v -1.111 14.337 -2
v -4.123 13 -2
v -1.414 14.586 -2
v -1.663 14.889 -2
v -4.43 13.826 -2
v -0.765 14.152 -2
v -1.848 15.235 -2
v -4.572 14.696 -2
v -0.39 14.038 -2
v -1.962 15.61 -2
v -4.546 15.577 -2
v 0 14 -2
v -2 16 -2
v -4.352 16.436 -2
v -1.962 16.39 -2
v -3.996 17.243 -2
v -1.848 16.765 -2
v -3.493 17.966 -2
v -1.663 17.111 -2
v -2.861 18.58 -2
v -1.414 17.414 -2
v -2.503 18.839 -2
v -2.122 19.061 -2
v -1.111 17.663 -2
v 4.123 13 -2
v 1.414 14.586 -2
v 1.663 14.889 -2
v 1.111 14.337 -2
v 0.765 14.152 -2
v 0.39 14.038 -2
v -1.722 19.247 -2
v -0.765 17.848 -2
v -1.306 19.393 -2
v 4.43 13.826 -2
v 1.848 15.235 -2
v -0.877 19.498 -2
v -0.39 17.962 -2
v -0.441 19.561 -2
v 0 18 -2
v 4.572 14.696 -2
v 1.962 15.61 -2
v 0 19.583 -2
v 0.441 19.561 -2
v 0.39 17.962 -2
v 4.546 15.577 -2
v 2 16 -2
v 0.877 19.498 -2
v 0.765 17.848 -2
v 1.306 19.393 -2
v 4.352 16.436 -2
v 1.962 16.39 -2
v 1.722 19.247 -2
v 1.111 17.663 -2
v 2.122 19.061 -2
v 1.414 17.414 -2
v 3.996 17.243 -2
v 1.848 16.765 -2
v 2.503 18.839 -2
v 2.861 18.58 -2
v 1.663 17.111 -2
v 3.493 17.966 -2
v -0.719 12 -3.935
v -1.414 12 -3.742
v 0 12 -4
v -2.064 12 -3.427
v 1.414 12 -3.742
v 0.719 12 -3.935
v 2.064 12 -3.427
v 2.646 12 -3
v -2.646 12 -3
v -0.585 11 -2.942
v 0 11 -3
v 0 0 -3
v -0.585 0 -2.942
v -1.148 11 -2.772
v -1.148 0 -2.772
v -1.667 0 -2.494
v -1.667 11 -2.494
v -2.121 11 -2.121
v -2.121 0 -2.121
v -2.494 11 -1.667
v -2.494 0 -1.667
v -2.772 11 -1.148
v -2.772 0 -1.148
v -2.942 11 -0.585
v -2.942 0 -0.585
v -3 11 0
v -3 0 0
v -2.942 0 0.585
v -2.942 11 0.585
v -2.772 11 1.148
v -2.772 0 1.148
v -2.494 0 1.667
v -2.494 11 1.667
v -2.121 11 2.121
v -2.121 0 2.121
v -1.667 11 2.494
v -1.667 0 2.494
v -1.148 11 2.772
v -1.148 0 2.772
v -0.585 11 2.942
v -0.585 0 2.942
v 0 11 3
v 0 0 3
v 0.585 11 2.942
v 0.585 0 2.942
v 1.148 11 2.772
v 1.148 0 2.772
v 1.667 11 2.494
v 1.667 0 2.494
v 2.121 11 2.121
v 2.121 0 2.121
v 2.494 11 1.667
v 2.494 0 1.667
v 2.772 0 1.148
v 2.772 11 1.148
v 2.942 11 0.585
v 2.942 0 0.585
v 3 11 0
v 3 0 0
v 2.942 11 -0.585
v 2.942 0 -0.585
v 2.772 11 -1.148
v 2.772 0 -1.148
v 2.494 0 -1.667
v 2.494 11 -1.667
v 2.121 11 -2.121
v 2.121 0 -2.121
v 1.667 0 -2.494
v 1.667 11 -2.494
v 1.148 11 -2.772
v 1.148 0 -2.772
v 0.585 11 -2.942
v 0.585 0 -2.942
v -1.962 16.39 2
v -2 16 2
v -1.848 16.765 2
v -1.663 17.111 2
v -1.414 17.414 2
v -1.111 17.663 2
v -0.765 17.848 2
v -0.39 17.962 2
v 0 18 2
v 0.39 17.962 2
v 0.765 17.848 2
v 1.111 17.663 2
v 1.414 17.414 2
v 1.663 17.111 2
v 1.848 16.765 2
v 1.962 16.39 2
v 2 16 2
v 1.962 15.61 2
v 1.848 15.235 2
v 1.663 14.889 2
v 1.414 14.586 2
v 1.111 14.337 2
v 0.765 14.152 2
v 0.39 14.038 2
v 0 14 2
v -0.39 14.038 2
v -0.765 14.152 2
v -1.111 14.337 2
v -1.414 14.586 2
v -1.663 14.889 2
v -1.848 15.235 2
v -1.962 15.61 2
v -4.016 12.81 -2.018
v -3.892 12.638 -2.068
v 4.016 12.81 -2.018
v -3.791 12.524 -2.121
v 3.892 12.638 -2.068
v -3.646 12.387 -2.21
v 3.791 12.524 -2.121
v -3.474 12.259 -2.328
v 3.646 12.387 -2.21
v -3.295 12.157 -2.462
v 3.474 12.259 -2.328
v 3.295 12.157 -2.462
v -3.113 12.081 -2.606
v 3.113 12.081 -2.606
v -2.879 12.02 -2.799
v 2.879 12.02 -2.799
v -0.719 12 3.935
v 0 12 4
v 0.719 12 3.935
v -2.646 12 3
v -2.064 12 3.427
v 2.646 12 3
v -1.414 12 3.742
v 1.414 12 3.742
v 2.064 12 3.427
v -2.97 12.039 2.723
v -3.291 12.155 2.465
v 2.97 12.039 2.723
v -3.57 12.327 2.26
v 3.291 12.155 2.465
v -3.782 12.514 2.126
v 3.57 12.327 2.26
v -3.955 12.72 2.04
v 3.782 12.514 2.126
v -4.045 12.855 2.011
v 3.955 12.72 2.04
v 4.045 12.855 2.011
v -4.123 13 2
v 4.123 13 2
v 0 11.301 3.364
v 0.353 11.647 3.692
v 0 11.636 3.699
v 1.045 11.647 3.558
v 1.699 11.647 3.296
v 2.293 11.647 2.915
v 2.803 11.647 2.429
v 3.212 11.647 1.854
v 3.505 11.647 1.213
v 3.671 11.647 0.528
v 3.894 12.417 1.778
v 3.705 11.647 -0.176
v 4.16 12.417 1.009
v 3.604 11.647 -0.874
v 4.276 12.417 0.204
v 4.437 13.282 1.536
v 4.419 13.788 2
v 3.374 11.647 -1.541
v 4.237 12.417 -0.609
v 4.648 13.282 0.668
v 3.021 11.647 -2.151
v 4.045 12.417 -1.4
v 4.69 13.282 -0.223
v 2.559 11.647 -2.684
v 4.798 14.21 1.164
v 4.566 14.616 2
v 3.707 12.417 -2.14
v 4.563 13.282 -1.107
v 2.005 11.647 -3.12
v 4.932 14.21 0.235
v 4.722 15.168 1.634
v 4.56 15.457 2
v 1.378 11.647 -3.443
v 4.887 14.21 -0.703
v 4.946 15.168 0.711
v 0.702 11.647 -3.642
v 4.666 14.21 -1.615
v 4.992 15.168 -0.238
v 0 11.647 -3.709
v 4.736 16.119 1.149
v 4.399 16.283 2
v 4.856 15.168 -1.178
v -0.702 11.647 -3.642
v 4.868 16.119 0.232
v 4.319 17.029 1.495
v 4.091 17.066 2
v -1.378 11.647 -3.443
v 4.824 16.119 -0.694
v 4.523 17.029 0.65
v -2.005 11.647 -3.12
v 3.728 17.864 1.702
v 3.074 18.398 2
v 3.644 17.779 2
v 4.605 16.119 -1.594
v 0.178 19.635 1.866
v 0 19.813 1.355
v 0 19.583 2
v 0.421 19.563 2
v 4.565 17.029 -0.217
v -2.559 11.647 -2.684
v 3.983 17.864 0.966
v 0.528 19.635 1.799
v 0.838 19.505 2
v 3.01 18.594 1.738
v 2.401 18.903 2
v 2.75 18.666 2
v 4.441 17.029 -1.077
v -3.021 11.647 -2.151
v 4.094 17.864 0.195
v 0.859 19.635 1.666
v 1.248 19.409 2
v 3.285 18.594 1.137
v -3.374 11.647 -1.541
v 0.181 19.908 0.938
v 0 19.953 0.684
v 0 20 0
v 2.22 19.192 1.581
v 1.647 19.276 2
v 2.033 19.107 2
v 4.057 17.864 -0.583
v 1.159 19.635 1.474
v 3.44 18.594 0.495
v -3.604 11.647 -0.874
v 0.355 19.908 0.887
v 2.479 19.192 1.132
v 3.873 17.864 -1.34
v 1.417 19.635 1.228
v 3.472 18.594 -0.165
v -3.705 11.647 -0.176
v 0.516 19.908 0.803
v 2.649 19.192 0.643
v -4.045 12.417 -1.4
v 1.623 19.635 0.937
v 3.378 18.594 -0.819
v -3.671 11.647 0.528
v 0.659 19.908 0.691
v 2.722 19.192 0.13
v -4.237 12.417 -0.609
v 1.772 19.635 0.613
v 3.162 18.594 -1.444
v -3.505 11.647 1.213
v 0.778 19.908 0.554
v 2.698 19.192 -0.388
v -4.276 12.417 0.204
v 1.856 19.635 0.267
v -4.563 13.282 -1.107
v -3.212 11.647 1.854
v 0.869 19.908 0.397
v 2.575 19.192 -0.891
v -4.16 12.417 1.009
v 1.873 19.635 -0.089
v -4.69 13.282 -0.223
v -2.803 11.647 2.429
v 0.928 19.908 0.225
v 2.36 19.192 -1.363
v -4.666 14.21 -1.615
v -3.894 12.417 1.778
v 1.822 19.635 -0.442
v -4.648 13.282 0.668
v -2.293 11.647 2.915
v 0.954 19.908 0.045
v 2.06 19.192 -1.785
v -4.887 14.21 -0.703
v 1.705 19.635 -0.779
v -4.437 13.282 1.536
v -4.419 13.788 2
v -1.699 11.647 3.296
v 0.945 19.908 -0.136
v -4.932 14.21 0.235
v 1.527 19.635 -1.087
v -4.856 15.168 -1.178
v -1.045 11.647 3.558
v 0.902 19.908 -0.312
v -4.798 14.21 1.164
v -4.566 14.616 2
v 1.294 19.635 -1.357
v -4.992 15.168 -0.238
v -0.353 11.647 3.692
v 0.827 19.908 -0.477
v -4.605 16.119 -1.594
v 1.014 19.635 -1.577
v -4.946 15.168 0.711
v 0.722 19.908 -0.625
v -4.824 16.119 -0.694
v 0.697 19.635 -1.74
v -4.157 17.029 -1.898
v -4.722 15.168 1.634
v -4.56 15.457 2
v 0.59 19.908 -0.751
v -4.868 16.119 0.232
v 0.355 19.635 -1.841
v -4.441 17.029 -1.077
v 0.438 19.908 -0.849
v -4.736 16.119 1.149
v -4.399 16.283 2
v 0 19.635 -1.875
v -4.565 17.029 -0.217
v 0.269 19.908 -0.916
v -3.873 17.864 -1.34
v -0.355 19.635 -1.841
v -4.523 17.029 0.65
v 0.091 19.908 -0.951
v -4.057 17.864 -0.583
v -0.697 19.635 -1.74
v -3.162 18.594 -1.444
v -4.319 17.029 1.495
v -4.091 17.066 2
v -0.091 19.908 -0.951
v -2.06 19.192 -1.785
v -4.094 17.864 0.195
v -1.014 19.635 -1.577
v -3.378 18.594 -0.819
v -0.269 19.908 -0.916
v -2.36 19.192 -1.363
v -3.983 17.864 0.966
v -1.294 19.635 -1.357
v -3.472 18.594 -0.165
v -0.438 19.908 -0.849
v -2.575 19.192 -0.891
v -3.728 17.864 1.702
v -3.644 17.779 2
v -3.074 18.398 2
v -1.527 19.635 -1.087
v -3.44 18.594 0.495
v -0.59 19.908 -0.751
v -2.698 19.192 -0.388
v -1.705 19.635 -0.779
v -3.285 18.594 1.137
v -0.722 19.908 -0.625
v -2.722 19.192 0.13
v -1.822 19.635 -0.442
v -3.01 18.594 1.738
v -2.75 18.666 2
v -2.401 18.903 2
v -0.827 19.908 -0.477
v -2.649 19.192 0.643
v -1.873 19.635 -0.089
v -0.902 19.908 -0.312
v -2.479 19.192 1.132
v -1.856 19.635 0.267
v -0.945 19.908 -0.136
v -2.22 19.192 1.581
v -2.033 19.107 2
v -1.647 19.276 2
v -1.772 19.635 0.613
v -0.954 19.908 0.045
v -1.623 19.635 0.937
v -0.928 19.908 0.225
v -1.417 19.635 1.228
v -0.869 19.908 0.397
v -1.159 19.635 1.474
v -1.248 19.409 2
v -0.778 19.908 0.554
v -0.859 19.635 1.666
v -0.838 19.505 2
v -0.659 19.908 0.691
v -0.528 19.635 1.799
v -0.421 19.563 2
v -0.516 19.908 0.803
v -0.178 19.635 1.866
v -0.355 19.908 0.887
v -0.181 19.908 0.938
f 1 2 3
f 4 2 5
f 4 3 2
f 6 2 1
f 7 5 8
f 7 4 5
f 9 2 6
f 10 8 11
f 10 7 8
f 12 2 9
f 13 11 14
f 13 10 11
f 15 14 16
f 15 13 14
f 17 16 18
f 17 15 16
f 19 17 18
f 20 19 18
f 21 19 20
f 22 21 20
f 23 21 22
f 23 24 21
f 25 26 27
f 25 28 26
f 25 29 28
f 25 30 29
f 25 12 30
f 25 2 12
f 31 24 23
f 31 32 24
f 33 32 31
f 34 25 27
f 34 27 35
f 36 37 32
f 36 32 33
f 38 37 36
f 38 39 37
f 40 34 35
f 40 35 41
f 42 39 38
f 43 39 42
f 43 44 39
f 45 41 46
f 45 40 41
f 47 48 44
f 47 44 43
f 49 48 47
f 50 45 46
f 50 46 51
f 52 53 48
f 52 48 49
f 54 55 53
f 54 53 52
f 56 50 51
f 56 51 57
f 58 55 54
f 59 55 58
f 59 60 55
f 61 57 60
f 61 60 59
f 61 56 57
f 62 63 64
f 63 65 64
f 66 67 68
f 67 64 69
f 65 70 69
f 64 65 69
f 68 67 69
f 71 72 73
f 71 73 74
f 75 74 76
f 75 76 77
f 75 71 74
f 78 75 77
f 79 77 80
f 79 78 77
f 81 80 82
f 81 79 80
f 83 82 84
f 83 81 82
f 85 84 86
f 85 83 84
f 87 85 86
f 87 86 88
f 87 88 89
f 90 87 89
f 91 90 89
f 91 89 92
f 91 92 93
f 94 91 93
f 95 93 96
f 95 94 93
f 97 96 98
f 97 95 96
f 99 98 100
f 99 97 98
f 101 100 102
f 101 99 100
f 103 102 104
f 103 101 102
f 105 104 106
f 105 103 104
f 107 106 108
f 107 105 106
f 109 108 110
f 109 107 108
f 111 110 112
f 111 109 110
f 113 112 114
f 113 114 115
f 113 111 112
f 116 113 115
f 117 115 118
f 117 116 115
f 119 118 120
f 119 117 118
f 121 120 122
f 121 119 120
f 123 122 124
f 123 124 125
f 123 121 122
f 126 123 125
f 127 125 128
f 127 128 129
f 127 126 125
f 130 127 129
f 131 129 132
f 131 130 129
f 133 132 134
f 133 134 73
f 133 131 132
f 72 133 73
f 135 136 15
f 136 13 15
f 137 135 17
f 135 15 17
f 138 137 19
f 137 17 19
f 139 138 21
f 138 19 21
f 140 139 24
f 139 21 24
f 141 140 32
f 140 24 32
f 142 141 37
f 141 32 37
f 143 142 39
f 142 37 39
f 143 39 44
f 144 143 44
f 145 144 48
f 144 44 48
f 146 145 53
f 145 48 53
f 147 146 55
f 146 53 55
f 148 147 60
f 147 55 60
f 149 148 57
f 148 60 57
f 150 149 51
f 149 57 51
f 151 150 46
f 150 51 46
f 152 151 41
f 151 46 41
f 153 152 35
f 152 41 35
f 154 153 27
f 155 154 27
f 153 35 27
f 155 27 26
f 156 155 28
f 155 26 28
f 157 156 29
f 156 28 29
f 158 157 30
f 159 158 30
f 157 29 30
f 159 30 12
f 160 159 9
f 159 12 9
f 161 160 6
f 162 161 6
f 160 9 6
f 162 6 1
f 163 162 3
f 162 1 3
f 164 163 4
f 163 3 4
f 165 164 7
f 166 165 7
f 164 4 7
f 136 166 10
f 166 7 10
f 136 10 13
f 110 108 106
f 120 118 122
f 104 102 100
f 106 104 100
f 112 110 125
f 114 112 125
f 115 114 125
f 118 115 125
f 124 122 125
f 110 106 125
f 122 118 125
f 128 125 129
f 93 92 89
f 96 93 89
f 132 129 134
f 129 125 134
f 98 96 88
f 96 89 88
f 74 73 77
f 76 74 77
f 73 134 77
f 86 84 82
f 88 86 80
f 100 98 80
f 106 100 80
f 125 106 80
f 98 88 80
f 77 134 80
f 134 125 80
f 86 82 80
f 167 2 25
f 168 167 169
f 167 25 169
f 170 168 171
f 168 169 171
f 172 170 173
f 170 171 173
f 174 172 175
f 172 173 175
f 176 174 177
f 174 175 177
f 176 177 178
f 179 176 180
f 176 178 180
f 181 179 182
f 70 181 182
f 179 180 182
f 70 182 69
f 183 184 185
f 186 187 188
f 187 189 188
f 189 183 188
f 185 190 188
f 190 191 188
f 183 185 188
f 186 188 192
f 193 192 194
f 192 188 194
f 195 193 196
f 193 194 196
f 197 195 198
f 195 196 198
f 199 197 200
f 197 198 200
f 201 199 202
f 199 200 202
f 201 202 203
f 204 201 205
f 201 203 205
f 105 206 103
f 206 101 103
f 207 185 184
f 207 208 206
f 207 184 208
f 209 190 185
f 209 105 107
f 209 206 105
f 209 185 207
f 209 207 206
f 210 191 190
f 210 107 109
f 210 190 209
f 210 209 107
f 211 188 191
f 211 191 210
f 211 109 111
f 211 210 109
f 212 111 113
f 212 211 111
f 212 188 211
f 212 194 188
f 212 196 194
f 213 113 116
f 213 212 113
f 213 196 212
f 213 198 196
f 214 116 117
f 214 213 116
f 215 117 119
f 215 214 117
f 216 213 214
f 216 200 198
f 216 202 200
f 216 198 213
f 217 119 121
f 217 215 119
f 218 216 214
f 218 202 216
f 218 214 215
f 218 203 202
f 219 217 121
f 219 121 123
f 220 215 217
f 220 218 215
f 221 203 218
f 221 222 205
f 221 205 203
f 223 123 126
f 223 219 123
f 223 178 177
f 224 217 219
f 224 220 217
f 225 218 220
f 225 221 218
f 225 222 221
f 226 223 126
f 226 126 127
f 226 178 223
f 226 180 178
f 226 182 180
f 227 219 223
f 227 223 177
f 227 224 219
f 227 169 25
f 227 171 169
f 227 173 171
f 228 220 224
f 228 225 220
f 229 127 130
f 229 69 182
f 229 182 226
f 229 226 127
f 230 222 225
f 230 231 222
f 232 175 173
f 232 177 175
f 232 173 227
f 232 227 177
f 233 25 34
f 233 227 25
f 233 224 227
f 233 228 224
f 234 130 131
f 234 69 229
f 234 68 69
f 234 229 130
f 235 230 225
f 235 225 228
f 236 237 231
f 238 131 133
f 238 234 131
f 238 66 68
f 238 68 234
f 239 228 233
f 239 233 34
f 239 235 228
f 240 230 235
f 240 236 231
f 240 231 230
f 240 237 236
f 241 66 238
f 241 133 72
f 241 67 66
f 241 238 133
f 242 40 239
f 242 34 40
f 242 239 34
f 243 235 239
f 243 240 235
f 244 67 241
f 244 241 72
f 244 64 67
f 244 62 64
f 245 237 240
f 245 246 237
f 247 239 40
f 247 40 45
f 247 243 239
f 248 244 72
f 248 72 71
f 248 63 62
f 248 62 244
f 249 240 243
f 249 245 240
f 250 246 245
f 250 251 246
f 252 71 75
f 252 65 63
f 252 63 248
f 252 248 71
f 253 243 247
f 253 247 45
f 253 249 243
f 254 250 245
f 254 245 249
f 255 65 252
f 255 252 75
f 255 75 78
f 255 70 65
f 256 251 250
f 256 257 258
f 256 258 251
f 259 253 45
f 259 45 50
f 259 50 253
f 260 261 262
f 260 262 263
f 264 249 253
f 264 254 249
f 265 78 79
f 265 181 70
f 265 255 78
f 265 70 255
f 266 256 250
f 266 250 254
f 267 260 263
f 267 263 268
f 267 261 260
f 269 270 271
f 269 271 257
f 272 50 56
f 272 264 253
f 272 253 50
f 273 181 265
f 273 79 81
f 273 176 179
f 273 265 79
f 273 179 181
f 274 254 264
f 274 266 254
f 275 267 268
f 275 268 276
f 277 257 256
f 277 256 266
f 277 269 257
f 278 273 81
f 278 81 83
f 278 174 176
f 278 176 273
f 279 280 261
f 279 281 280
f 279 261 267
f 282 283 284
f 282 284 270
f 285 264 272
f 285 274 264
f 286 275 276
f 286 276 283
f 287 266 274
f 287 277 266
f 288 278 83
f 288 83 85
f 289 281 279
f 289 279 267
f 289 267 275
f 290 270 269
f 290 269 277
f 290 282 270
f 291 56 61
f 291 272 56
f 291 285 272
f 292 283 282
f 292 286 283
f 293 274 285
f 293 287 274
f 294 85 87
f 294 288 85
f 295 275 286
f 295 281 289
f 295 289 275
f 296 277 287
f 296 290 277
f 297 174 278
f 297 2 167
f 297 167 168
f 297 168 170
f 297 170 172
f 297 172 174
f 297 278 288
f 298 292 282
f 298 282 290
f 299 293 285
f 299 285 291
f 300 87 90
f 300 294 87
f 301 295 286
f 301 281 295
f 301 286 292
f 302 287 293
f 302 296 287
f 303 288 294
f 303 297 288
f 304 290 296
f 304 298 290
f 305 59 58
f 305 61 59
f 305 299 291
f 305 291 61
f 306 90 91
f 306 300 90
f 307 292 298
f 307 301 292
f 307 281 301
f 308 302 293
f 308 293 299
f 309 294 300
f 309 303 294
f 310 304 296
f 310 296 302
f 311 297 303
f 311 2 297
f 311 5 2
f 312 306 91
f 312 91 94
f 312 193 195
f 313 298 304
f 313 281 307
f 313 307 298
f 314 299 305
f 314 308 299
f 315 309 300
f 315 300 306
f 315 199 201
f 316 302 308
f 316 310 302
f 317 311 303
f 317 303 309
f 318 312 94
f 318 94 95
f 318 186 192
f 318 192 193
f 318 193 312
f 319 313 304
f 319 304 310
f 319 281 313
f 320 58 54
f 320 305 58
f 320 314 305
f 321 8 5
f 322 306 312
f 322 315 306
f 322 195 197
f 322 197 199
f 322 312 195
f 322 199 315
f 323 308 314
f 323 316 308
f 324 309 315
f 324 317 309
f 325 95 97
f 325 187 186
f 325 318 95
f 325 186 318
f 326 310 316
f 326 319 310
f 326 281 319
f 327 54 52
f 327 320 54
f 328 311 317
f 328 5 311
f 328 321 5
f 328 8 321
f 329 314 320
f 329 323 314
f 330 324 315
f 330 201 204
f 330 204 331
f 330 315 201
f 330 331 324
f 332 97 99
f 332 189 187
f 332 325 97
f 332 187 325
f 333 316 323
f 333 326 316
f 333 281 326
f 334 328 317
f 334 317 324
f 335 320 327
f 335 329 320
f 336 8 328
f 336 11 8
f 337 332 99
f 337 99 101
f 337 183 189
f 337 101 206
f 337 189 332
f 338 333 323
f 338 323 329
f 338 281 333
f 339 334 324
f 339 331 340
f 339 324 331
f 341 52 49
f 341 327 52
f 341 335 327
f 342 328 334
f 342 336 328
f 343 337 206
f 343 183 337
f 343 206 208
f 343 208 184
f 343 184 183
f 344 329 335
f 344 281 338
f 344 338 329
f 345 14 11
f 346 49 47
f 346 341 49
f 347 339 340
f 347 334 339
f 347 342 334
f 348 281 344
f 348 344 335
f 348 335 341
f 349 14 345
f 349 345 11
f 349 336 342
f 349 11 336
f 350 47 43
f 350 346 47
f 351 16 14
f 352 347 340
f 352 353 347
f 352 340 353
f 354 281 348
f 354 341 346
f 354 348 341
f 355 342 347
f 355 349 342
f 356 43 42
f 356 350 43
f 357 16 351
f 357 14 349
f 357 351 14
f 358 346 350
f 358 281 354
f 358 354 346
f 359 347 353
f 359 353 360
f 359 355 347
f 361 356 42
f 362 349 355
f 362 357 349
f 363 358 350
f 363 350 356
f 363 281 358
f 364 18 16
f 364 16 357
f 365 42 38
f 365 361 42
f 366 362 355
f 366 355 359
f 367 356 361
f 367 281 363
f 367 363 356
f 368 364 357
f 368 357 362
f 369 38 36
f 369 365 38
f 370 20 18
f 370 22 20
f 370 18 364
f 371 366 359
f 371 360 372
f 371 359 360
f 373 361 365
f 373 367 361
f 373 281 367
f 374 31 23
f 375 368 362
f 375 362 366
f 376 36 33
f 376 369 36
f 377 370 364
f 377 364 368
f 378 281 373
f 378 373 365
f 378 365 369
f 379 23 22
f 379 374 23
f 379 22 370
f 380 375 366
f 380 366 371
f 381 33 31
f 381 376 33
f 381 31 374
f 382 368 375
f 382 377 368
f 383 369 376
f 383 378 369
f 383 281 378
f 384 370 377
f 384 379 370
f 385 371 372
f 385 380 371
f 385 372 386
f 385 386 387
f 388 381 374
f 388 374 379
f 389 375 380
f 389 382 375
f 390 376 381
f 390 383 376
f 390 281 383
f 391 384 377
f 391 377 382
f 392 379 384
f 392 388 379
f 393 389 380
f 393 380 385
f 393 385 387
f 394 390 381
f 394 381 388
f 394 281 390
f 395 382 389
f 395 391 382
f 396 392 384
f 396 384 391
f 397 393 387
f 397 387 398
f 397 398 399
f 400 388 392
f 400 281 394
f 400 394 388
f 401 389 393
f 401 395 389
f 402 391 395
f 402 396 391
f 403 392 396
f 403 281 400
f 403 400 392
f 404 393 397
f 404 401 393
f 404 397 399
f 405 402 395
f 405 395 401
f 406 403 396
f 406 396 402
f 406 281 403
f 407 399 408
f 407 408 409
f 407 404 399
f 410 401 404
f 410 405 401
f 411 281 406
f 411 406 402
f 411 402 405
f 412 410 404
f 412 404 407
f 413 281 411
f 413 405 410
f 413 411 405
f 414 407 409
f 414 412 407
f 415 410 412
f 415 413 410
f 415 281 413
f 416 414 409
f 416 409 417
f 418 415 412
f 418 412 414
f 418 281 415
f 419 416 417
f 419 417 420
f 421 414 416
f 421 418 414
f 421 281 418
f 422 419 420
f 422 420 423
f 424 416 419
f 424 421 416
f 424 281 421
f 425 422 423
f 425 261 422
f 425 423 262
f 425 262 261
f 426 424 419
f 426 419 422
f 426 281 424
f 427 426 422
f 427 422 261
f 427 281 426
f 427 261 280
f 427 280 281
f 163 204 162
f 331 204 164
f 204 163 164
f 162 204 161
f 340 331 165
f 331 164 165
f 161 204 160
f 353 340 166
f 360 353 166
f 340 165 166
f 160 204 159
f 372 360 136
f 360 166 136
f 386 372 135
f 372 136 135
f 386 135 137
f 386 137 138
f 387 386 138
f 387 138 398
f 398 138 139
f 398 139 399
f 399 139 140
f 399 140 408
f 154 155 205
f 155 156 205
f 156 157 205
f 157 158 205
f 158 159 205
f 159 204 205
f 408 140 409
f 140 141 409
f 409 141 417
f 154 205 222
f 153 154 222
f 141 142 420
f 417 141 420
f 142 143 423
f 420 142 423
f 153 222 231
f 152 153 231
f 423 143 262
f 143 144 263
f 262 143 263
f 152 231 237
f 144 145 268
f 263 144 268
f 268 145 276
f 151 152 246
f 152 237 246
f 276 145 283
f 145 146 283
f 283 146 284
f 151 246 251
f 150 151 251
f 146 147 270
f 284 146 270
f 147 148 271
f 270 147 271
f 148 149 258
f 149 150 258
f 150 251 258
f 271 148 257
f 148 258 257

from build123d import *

# Parameters (mm, degrees)
CROQUIS4_W            = 3
CROQUIS4_H            = 11
CROQUIS7_W            = 4
CROQUIS7_H            = 8
CORTAR_EXTRUIR1_DEPTH = 7.5
CROQUIS9_W            = 5
CROQUIS9_H            = 8
CORTAR_EXTRUIR2_DEPTH = 7.5
REDONDEO3_R           = 1
CROQUIS10_R           = 2
CORTAR_EXTRUIR3_DEPTH = 7.5


with BuildPart() as part:
    # Croquis4 → Revolución2 (revolve)
    with BuildSketch(Plane(origin=(0, 0, 0), x_dir=(0, 0, -1), z_dir=(1, 0, 0)), mode=Mode.PRIVATE) as revoluci_n2_sk:
        with Locations((-1.5, 5.5)):
            Rectangle(CROQUIS4_W, CROQUIS4_H)
    revolve(revoluci_n2_sk.sketch.rotate(Axis((0, 0, 0), (0, 1, 0)), 180), axis=Axis((0, 0, 0), (0, 1, 0)))

    # Croquis5 → Revolución3 (revolve)
    with BuildSketch(Plane(origin=(0, 0, 0), x_dir=(0, 0, -1), z_dir=(1, 0, 0))):
        with BuildLine():
            Line((0, 20), (0, 11))
            Line((0, 11), (-3, 11))
            ThreePointArc((-3, 11), (-4.74341649, 16.58113883), (0, 20))
        make_face()
    revolve(axis=Axis((0, 20, 0), (0, 1, 0)))

    # Croquis7 → Cortar-Extruir1 (cut, symmetric)
    with BuildSketch(Plane(origin=(0, 0, 0), x_dir=(0, 0, -1), z_dir=(1, 0, 0))):
        with Locations((4, 16)):
            Rectangle(CROQUIS7_W, CROQUIS7_H)
    extrude(amount=CORTAR_EXTRUIR1_DEPTH, both=True, mode=Mode.SUBTRACT)

    # Croquis9 → Cortar-Extruir2 (cut, symmetric)
    with BuildSketch(Plane(origin=(0, 0, 0), x_dir=(0, 0, -1), z_dir=(1, 0, 0))):
        with Locations((-4.5, 16)):
            Rectangle(CROQUIS9_W, CROQUIS9_H)
    extrude(amount=CORTAR_EXTRUIR2_DEPTH, both=True, mode=Mode.SUBTRACT)

    # Redondeo3
    redondeo3_edges = [part.edges().sort_by_distance(p)[0] for p in [
        (0, 12, -2),
        (0, 12, 2),
    ]]
    fillet(redondeo3_edges, radius=REDONDEO3_R)

    # Croquis10 → Cortar-Extruir3 (cut, symmetric)
    with BuildSketch(Plane(origin=(0, 0, 0), x_dir=(-1, 0, 0), z_dir=(0, 0, -1))):
        with Locations((0, 16)):
            Circle(CROQUIS10_R)
    extrude(amount=CORTAR_EXTRUIR3_DEPTH, both=True, mode=Mode.SUBTRACT)


solid = part.part
